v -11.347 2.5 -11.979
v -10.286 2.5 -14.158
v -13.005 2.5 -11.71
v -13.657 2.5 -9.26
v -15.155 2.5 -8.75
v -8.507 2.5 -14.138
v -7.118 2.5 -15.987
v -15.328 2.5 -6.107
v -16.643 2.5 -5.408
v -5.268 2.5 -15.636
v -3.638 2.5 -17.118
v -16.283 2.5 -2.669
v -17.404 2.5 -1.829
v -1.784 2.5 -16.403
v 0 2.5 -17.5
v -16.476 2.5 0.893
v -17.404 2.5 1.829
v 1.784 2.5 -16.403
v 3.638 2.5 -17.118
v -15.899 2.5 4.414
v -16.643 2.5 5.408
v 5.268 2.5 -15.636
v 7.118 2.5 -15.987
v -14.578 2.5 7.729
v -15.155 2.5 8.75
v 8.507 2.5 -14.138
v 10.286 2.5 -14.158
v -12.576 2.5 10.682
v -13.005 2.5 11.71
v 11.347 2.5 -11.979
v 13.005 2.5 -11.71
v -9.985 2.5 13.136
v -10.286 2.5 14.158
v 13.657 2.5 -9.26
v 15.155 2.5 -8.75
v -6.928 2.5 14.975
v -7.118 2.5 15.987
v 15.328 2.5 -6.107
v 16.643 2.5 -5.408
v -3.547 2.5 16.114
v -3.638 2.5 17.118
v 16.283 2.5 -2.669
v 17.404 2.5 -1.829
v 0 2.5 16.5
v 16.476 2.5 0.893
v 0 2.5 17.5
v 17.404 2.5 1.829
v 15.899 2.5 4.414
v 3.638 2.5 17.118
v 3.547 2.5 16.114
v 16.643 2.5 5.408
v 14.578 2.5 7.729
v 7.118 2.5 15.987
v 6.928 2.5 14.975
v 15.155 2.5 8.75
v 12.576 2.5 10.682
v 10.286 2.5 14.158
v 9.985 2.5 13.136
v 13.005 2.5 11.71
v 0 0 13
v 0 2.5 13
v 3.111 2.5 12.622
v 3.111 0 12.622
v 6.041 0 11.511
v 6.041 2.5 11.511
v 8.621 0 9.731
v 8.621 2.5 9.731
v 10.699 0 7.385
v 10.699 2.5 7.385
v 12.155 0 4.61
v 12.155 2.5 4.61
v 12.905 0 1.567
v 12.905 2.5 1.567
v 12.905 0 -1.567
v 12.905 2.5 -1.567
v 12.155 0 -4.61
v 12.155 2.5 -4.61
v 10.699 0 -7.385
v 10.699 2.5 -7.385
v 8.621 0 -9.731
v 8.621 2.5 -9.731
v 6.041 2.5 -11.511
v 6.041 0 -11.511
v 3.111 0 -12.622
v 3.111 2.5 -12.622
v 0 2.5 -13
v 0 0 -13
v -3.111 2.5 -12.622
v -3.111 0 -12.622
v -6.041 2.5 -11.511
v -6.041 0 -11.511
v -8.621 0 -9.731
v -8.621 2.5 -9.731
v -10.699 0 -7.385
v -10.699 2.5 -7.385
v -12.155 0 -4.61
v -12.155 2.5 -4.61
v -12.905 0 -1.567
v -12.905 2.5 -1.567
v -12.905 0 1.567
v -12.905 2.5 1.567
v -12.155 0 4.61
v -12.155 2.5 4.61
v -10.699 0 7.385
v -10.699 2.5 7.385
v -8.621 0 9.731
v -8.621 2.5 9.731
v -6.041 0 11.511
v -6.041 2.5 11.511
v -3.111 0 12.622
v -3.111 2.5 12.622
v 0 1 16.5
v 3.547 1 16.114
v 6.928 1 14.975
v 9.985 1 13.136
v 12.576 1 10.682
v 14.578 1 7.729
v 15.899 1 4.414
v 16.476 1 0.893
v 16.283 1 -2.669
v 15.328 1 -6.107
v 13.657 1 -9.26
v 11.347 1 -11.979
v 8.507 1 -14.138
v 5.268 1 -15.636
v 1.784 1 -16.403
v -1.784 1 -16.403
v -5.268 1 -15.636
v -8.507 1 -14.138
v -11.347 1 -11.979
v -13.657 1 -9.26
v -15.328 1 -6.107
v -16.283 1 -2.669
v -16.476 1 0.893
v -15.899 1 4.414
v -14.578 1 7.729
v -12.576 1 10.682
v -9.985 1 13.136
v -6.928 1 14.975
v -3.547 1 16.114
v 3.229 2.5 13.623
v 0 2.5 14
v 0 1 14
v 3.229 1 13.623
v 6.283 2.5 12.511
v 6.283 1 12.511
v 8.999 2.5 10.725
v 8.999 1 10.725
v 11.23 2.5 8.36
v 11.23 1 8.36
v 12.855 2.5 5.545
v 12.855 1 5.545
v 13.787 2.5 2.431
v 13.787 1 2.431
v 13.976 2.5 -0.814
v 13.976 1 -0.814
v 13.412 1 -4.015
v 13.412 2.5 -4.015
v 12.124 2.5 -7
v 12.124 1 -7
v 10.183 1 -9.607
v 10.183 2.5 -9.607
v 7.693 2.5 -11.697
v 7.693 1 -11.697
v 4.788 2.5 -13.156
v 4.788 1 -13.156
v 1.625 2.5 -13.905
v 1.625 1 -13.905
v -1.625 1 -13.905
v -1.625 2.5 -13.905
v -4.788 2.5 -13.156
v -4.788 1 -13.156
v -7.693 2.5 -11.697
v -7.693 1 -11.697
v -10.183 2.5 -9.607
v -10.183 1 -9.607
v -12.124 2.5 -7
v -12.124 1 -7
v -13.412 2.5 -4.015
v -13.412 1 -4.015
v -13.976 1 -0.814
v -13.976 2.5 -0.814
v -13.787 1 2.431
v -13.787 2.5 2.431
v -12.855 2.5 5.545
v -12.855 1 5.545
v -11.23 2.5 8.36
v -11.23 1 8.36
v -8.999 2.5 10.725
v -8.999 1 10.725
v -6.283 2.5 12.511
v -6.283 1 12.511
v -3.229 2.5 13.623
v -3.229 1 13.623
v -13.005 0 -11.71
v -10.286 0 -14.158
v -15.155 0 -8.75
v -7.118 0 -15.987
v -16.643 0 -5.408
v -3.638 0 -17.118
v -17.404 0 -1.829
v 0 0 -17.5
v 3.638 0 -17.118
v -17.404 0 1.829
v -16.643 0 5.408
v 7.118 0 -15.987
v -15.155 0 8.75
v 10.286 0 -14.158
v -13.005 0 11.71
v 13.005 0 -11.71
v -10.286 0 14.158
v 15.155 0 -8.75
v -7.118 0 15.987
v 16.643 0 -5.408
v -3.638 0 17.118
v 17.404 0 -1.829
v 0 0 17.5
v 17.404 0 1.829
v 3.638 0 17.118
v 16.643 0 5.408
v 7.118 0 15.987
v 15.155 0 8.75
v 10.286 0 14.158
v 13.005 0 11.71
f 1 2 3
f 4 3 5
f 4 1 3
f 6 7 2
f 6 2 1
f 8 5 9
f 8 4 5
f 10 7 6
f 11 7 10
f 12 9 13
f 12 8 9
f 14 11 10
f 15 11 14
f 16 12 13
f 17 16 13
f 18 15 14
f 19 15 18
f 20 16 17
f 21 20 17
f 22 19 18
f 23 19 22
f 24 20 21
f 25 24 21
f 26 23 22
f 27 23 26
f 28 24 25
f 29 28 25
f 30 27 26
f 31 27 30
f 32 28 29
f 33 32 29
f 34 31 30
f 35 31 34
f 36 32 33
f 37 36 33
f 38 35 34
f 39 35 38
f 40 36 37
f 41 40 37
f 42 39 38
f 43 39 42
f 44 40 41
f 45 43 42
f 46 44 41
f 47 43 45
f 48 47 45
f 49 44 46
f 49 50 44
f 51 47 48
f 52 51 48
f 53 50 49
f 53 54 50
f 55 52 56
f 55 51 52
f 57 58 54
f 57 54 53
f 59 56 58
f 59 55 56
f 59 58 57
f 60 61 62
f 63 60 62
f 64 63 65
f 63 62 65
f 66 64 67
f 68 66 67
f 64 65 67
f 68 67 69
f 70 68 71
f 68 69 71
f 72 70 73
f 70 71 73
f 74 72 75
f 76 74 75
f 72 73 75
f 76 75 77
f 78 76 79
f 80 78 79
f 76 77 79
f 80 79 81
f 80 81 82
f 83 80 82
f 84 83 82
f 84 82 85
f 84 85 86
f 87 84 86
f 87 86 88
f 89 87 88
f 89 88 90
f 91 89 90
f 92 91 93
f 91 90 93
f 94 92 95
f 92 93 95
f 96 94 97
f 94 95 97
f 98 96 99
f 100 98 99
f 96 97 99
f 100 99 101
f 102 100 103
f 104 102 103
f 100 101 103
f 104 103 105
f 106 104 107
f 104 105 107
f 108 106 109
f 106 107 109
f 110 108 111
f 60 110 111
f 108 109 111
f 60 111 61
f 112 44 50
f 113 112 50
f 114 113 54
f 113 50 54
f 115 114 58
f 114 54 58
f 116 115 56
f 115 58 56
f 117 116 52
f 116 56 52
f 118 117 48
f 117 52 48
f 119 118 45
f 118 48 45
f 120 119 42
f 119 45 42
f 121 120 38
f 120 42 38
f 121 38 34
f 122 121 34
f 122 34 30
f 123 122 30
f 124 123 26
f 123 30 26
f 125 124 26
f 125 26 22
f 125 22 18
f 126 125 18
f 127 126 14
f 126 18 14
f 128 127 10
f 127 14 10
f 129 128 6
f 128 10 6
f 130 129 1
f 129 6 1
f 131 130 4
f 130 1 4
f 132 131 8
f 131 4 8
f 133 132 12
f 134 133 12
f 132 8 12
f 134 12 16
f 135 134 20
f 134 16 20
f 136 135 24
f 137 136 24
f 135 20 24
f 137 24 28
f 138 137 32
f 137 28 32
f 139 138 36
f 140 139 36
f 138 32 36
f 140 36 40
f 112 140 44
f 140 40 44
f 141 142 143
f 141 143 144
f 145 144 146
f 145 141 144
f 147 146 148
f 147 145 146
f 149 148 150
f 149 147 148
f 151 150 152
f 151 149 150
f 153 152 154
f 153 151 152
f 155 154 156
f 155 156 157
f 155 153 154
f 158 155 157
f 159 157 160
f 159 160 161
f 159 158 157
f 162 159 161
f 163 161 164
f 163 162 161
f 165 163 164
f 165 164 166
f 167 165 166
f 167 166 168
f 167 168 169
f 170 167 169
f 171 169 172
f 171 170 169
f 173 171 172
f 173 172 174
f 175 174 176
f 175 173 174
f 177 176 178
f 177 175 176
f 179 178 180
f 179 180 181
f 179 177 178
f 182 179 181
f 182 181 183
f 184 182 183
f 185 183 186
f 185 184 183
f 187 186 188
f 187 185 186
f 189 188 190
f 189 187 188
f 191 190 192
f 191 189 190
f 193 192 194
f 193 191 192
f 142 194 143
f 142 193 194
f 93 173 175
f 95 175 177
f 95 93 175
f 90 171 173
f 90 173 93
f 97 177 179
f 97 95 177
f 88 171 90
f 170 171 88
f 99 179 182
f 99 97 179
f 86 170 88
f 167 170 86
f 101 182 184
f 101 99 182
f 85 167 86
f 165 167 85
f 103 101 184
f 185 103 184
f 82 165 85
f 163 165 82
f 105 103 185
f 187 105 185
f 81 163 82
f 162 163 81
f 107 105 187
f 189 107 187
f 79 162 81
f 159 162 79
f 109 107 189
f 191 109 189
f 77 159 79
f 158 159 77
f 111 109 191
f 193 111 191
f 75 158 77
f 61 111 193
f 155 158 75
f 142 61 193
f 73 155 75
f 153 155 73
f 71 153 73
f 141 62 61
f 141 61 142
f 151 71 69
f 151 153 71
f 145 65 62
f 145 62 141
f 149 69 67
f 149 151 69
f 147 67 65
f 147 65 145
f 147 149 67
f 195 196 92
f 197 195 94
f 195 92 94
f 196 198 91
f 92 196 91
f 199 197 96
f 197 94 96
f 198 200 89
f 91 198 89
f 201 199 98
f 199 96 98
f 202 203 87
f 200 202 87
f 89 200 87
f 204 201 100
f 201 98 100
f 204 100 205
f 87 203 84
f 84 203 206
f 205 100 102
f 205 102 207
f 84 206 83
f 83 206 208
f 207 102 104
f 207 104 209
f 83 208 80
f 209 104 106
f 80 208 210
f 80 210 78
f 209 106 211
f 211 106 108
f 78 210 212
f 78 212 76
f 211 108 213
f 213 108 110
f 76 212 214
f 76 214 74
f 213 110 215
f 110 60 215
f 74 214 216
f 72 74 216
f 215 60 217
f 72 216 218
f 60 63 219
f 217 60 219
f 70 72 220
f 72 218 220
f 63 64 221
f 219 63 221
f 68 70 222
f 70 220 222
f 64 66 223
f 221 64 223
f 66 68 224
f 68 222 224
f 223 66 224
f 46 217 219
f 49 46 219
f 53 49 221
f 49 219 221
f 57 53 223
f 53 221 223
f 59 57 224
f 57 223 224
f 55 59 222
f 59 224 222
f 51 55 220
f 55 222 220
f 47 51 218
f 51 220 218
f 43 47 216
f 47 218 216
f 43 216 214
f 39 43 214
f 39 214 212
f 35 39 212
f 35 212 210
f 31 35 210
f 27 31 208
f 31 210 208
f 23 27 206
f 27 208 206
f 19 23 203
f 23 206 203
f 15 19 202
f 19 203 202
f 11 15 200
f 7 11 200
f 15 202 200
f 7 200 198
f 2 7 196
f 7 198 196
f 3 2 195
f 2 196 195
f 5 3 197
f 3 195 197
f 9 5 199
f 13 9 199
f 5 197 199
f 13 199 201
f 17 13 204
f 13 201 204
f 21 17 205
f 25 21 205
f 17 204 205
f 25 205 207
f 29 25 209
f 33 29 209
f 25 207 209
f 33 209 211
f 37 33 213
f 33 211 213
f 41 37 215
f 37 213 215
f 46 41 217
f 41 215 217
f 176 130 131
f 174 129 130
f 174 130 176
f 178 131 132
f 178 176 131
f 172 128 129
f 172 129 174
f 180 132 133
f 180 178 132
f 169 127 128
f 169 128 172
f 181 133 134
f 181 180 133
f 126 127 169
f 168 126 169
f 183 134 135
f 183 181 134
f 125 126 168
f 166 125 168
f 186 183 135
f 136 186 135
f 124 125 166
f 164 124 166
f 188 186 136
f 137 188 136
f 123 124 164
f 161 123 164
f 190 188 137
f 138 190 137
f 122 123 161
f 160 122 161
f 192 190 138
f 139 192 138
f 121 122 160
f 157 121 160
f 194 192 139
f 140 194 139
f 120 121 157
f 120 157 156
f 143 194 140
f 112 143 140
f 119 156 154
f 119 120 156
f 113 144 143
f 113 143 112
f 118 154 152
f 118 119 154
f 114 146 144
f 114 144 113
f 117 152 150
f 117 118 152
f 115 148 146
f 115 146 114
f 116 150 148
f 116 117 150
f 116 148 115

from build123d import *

# Parameters (mm, degrees)
SKETCH_1_R          = 17.5
EXTRUDE_1_DEPTH     = 2.5
SKETCH_2_R          = 13
CUT_EXTRUDE_1_DEPTH = 2.5
SKETCH_3_R          = 16.5
SKETCH_3_R_2        = 14
CUT_EXTRUDE_2_DEPTH = 1.5


with BuildPart() as part:
    # 草图1 → 凸台-拉伸1 (new body)
    with BuildSketch(Plane(origin=(0, 0, 0), x_dir=(1, 0, 0), z_dir=(0, 1, 0))):
        with Locations(Location((0, 0, 0), (0, 0, 270))):
            Circle(SKETCH_1_R)
    extrude(amount=EXTRUDE_1_DEPTH)

    # 草图2 → 切除-拉伸1 (cut)
    with BuildSketch(Plane(origin=(0, 2.5, 0), x_dir=(1, 0, 0), z_dir=(0, 1, 0))):
        with Locations(Location((0, 0, 0), (0, 0, 270))):
            Circle(SKETCH_2_R)
    extrude(amount=-CUT_EXTRUDE_1_DEPTH, mode=Mode.SUBTRACT)

    # 草图3 → 切除-拉伸2 (cut)
    with BuildSketch(Plane(origin=(0, 2.5, 0), x_dir=(1, 0, 0), z_dir=(0, 1, 0))):
        with Locations(Location((0, 0, 0), (0, 0, 270))):
            Circle(SKETCH_3_R)
        with Locations(Location((0, 0, 0), (0, 0, 270))):
            Circle(SKETCH_3_R_2, mode=Mode.SUBTRACT)
    extrude(amount=-CUT_EXTRUDE_2_DEPTH, mode=Mode.SUBTRACT)


solid = part.part
